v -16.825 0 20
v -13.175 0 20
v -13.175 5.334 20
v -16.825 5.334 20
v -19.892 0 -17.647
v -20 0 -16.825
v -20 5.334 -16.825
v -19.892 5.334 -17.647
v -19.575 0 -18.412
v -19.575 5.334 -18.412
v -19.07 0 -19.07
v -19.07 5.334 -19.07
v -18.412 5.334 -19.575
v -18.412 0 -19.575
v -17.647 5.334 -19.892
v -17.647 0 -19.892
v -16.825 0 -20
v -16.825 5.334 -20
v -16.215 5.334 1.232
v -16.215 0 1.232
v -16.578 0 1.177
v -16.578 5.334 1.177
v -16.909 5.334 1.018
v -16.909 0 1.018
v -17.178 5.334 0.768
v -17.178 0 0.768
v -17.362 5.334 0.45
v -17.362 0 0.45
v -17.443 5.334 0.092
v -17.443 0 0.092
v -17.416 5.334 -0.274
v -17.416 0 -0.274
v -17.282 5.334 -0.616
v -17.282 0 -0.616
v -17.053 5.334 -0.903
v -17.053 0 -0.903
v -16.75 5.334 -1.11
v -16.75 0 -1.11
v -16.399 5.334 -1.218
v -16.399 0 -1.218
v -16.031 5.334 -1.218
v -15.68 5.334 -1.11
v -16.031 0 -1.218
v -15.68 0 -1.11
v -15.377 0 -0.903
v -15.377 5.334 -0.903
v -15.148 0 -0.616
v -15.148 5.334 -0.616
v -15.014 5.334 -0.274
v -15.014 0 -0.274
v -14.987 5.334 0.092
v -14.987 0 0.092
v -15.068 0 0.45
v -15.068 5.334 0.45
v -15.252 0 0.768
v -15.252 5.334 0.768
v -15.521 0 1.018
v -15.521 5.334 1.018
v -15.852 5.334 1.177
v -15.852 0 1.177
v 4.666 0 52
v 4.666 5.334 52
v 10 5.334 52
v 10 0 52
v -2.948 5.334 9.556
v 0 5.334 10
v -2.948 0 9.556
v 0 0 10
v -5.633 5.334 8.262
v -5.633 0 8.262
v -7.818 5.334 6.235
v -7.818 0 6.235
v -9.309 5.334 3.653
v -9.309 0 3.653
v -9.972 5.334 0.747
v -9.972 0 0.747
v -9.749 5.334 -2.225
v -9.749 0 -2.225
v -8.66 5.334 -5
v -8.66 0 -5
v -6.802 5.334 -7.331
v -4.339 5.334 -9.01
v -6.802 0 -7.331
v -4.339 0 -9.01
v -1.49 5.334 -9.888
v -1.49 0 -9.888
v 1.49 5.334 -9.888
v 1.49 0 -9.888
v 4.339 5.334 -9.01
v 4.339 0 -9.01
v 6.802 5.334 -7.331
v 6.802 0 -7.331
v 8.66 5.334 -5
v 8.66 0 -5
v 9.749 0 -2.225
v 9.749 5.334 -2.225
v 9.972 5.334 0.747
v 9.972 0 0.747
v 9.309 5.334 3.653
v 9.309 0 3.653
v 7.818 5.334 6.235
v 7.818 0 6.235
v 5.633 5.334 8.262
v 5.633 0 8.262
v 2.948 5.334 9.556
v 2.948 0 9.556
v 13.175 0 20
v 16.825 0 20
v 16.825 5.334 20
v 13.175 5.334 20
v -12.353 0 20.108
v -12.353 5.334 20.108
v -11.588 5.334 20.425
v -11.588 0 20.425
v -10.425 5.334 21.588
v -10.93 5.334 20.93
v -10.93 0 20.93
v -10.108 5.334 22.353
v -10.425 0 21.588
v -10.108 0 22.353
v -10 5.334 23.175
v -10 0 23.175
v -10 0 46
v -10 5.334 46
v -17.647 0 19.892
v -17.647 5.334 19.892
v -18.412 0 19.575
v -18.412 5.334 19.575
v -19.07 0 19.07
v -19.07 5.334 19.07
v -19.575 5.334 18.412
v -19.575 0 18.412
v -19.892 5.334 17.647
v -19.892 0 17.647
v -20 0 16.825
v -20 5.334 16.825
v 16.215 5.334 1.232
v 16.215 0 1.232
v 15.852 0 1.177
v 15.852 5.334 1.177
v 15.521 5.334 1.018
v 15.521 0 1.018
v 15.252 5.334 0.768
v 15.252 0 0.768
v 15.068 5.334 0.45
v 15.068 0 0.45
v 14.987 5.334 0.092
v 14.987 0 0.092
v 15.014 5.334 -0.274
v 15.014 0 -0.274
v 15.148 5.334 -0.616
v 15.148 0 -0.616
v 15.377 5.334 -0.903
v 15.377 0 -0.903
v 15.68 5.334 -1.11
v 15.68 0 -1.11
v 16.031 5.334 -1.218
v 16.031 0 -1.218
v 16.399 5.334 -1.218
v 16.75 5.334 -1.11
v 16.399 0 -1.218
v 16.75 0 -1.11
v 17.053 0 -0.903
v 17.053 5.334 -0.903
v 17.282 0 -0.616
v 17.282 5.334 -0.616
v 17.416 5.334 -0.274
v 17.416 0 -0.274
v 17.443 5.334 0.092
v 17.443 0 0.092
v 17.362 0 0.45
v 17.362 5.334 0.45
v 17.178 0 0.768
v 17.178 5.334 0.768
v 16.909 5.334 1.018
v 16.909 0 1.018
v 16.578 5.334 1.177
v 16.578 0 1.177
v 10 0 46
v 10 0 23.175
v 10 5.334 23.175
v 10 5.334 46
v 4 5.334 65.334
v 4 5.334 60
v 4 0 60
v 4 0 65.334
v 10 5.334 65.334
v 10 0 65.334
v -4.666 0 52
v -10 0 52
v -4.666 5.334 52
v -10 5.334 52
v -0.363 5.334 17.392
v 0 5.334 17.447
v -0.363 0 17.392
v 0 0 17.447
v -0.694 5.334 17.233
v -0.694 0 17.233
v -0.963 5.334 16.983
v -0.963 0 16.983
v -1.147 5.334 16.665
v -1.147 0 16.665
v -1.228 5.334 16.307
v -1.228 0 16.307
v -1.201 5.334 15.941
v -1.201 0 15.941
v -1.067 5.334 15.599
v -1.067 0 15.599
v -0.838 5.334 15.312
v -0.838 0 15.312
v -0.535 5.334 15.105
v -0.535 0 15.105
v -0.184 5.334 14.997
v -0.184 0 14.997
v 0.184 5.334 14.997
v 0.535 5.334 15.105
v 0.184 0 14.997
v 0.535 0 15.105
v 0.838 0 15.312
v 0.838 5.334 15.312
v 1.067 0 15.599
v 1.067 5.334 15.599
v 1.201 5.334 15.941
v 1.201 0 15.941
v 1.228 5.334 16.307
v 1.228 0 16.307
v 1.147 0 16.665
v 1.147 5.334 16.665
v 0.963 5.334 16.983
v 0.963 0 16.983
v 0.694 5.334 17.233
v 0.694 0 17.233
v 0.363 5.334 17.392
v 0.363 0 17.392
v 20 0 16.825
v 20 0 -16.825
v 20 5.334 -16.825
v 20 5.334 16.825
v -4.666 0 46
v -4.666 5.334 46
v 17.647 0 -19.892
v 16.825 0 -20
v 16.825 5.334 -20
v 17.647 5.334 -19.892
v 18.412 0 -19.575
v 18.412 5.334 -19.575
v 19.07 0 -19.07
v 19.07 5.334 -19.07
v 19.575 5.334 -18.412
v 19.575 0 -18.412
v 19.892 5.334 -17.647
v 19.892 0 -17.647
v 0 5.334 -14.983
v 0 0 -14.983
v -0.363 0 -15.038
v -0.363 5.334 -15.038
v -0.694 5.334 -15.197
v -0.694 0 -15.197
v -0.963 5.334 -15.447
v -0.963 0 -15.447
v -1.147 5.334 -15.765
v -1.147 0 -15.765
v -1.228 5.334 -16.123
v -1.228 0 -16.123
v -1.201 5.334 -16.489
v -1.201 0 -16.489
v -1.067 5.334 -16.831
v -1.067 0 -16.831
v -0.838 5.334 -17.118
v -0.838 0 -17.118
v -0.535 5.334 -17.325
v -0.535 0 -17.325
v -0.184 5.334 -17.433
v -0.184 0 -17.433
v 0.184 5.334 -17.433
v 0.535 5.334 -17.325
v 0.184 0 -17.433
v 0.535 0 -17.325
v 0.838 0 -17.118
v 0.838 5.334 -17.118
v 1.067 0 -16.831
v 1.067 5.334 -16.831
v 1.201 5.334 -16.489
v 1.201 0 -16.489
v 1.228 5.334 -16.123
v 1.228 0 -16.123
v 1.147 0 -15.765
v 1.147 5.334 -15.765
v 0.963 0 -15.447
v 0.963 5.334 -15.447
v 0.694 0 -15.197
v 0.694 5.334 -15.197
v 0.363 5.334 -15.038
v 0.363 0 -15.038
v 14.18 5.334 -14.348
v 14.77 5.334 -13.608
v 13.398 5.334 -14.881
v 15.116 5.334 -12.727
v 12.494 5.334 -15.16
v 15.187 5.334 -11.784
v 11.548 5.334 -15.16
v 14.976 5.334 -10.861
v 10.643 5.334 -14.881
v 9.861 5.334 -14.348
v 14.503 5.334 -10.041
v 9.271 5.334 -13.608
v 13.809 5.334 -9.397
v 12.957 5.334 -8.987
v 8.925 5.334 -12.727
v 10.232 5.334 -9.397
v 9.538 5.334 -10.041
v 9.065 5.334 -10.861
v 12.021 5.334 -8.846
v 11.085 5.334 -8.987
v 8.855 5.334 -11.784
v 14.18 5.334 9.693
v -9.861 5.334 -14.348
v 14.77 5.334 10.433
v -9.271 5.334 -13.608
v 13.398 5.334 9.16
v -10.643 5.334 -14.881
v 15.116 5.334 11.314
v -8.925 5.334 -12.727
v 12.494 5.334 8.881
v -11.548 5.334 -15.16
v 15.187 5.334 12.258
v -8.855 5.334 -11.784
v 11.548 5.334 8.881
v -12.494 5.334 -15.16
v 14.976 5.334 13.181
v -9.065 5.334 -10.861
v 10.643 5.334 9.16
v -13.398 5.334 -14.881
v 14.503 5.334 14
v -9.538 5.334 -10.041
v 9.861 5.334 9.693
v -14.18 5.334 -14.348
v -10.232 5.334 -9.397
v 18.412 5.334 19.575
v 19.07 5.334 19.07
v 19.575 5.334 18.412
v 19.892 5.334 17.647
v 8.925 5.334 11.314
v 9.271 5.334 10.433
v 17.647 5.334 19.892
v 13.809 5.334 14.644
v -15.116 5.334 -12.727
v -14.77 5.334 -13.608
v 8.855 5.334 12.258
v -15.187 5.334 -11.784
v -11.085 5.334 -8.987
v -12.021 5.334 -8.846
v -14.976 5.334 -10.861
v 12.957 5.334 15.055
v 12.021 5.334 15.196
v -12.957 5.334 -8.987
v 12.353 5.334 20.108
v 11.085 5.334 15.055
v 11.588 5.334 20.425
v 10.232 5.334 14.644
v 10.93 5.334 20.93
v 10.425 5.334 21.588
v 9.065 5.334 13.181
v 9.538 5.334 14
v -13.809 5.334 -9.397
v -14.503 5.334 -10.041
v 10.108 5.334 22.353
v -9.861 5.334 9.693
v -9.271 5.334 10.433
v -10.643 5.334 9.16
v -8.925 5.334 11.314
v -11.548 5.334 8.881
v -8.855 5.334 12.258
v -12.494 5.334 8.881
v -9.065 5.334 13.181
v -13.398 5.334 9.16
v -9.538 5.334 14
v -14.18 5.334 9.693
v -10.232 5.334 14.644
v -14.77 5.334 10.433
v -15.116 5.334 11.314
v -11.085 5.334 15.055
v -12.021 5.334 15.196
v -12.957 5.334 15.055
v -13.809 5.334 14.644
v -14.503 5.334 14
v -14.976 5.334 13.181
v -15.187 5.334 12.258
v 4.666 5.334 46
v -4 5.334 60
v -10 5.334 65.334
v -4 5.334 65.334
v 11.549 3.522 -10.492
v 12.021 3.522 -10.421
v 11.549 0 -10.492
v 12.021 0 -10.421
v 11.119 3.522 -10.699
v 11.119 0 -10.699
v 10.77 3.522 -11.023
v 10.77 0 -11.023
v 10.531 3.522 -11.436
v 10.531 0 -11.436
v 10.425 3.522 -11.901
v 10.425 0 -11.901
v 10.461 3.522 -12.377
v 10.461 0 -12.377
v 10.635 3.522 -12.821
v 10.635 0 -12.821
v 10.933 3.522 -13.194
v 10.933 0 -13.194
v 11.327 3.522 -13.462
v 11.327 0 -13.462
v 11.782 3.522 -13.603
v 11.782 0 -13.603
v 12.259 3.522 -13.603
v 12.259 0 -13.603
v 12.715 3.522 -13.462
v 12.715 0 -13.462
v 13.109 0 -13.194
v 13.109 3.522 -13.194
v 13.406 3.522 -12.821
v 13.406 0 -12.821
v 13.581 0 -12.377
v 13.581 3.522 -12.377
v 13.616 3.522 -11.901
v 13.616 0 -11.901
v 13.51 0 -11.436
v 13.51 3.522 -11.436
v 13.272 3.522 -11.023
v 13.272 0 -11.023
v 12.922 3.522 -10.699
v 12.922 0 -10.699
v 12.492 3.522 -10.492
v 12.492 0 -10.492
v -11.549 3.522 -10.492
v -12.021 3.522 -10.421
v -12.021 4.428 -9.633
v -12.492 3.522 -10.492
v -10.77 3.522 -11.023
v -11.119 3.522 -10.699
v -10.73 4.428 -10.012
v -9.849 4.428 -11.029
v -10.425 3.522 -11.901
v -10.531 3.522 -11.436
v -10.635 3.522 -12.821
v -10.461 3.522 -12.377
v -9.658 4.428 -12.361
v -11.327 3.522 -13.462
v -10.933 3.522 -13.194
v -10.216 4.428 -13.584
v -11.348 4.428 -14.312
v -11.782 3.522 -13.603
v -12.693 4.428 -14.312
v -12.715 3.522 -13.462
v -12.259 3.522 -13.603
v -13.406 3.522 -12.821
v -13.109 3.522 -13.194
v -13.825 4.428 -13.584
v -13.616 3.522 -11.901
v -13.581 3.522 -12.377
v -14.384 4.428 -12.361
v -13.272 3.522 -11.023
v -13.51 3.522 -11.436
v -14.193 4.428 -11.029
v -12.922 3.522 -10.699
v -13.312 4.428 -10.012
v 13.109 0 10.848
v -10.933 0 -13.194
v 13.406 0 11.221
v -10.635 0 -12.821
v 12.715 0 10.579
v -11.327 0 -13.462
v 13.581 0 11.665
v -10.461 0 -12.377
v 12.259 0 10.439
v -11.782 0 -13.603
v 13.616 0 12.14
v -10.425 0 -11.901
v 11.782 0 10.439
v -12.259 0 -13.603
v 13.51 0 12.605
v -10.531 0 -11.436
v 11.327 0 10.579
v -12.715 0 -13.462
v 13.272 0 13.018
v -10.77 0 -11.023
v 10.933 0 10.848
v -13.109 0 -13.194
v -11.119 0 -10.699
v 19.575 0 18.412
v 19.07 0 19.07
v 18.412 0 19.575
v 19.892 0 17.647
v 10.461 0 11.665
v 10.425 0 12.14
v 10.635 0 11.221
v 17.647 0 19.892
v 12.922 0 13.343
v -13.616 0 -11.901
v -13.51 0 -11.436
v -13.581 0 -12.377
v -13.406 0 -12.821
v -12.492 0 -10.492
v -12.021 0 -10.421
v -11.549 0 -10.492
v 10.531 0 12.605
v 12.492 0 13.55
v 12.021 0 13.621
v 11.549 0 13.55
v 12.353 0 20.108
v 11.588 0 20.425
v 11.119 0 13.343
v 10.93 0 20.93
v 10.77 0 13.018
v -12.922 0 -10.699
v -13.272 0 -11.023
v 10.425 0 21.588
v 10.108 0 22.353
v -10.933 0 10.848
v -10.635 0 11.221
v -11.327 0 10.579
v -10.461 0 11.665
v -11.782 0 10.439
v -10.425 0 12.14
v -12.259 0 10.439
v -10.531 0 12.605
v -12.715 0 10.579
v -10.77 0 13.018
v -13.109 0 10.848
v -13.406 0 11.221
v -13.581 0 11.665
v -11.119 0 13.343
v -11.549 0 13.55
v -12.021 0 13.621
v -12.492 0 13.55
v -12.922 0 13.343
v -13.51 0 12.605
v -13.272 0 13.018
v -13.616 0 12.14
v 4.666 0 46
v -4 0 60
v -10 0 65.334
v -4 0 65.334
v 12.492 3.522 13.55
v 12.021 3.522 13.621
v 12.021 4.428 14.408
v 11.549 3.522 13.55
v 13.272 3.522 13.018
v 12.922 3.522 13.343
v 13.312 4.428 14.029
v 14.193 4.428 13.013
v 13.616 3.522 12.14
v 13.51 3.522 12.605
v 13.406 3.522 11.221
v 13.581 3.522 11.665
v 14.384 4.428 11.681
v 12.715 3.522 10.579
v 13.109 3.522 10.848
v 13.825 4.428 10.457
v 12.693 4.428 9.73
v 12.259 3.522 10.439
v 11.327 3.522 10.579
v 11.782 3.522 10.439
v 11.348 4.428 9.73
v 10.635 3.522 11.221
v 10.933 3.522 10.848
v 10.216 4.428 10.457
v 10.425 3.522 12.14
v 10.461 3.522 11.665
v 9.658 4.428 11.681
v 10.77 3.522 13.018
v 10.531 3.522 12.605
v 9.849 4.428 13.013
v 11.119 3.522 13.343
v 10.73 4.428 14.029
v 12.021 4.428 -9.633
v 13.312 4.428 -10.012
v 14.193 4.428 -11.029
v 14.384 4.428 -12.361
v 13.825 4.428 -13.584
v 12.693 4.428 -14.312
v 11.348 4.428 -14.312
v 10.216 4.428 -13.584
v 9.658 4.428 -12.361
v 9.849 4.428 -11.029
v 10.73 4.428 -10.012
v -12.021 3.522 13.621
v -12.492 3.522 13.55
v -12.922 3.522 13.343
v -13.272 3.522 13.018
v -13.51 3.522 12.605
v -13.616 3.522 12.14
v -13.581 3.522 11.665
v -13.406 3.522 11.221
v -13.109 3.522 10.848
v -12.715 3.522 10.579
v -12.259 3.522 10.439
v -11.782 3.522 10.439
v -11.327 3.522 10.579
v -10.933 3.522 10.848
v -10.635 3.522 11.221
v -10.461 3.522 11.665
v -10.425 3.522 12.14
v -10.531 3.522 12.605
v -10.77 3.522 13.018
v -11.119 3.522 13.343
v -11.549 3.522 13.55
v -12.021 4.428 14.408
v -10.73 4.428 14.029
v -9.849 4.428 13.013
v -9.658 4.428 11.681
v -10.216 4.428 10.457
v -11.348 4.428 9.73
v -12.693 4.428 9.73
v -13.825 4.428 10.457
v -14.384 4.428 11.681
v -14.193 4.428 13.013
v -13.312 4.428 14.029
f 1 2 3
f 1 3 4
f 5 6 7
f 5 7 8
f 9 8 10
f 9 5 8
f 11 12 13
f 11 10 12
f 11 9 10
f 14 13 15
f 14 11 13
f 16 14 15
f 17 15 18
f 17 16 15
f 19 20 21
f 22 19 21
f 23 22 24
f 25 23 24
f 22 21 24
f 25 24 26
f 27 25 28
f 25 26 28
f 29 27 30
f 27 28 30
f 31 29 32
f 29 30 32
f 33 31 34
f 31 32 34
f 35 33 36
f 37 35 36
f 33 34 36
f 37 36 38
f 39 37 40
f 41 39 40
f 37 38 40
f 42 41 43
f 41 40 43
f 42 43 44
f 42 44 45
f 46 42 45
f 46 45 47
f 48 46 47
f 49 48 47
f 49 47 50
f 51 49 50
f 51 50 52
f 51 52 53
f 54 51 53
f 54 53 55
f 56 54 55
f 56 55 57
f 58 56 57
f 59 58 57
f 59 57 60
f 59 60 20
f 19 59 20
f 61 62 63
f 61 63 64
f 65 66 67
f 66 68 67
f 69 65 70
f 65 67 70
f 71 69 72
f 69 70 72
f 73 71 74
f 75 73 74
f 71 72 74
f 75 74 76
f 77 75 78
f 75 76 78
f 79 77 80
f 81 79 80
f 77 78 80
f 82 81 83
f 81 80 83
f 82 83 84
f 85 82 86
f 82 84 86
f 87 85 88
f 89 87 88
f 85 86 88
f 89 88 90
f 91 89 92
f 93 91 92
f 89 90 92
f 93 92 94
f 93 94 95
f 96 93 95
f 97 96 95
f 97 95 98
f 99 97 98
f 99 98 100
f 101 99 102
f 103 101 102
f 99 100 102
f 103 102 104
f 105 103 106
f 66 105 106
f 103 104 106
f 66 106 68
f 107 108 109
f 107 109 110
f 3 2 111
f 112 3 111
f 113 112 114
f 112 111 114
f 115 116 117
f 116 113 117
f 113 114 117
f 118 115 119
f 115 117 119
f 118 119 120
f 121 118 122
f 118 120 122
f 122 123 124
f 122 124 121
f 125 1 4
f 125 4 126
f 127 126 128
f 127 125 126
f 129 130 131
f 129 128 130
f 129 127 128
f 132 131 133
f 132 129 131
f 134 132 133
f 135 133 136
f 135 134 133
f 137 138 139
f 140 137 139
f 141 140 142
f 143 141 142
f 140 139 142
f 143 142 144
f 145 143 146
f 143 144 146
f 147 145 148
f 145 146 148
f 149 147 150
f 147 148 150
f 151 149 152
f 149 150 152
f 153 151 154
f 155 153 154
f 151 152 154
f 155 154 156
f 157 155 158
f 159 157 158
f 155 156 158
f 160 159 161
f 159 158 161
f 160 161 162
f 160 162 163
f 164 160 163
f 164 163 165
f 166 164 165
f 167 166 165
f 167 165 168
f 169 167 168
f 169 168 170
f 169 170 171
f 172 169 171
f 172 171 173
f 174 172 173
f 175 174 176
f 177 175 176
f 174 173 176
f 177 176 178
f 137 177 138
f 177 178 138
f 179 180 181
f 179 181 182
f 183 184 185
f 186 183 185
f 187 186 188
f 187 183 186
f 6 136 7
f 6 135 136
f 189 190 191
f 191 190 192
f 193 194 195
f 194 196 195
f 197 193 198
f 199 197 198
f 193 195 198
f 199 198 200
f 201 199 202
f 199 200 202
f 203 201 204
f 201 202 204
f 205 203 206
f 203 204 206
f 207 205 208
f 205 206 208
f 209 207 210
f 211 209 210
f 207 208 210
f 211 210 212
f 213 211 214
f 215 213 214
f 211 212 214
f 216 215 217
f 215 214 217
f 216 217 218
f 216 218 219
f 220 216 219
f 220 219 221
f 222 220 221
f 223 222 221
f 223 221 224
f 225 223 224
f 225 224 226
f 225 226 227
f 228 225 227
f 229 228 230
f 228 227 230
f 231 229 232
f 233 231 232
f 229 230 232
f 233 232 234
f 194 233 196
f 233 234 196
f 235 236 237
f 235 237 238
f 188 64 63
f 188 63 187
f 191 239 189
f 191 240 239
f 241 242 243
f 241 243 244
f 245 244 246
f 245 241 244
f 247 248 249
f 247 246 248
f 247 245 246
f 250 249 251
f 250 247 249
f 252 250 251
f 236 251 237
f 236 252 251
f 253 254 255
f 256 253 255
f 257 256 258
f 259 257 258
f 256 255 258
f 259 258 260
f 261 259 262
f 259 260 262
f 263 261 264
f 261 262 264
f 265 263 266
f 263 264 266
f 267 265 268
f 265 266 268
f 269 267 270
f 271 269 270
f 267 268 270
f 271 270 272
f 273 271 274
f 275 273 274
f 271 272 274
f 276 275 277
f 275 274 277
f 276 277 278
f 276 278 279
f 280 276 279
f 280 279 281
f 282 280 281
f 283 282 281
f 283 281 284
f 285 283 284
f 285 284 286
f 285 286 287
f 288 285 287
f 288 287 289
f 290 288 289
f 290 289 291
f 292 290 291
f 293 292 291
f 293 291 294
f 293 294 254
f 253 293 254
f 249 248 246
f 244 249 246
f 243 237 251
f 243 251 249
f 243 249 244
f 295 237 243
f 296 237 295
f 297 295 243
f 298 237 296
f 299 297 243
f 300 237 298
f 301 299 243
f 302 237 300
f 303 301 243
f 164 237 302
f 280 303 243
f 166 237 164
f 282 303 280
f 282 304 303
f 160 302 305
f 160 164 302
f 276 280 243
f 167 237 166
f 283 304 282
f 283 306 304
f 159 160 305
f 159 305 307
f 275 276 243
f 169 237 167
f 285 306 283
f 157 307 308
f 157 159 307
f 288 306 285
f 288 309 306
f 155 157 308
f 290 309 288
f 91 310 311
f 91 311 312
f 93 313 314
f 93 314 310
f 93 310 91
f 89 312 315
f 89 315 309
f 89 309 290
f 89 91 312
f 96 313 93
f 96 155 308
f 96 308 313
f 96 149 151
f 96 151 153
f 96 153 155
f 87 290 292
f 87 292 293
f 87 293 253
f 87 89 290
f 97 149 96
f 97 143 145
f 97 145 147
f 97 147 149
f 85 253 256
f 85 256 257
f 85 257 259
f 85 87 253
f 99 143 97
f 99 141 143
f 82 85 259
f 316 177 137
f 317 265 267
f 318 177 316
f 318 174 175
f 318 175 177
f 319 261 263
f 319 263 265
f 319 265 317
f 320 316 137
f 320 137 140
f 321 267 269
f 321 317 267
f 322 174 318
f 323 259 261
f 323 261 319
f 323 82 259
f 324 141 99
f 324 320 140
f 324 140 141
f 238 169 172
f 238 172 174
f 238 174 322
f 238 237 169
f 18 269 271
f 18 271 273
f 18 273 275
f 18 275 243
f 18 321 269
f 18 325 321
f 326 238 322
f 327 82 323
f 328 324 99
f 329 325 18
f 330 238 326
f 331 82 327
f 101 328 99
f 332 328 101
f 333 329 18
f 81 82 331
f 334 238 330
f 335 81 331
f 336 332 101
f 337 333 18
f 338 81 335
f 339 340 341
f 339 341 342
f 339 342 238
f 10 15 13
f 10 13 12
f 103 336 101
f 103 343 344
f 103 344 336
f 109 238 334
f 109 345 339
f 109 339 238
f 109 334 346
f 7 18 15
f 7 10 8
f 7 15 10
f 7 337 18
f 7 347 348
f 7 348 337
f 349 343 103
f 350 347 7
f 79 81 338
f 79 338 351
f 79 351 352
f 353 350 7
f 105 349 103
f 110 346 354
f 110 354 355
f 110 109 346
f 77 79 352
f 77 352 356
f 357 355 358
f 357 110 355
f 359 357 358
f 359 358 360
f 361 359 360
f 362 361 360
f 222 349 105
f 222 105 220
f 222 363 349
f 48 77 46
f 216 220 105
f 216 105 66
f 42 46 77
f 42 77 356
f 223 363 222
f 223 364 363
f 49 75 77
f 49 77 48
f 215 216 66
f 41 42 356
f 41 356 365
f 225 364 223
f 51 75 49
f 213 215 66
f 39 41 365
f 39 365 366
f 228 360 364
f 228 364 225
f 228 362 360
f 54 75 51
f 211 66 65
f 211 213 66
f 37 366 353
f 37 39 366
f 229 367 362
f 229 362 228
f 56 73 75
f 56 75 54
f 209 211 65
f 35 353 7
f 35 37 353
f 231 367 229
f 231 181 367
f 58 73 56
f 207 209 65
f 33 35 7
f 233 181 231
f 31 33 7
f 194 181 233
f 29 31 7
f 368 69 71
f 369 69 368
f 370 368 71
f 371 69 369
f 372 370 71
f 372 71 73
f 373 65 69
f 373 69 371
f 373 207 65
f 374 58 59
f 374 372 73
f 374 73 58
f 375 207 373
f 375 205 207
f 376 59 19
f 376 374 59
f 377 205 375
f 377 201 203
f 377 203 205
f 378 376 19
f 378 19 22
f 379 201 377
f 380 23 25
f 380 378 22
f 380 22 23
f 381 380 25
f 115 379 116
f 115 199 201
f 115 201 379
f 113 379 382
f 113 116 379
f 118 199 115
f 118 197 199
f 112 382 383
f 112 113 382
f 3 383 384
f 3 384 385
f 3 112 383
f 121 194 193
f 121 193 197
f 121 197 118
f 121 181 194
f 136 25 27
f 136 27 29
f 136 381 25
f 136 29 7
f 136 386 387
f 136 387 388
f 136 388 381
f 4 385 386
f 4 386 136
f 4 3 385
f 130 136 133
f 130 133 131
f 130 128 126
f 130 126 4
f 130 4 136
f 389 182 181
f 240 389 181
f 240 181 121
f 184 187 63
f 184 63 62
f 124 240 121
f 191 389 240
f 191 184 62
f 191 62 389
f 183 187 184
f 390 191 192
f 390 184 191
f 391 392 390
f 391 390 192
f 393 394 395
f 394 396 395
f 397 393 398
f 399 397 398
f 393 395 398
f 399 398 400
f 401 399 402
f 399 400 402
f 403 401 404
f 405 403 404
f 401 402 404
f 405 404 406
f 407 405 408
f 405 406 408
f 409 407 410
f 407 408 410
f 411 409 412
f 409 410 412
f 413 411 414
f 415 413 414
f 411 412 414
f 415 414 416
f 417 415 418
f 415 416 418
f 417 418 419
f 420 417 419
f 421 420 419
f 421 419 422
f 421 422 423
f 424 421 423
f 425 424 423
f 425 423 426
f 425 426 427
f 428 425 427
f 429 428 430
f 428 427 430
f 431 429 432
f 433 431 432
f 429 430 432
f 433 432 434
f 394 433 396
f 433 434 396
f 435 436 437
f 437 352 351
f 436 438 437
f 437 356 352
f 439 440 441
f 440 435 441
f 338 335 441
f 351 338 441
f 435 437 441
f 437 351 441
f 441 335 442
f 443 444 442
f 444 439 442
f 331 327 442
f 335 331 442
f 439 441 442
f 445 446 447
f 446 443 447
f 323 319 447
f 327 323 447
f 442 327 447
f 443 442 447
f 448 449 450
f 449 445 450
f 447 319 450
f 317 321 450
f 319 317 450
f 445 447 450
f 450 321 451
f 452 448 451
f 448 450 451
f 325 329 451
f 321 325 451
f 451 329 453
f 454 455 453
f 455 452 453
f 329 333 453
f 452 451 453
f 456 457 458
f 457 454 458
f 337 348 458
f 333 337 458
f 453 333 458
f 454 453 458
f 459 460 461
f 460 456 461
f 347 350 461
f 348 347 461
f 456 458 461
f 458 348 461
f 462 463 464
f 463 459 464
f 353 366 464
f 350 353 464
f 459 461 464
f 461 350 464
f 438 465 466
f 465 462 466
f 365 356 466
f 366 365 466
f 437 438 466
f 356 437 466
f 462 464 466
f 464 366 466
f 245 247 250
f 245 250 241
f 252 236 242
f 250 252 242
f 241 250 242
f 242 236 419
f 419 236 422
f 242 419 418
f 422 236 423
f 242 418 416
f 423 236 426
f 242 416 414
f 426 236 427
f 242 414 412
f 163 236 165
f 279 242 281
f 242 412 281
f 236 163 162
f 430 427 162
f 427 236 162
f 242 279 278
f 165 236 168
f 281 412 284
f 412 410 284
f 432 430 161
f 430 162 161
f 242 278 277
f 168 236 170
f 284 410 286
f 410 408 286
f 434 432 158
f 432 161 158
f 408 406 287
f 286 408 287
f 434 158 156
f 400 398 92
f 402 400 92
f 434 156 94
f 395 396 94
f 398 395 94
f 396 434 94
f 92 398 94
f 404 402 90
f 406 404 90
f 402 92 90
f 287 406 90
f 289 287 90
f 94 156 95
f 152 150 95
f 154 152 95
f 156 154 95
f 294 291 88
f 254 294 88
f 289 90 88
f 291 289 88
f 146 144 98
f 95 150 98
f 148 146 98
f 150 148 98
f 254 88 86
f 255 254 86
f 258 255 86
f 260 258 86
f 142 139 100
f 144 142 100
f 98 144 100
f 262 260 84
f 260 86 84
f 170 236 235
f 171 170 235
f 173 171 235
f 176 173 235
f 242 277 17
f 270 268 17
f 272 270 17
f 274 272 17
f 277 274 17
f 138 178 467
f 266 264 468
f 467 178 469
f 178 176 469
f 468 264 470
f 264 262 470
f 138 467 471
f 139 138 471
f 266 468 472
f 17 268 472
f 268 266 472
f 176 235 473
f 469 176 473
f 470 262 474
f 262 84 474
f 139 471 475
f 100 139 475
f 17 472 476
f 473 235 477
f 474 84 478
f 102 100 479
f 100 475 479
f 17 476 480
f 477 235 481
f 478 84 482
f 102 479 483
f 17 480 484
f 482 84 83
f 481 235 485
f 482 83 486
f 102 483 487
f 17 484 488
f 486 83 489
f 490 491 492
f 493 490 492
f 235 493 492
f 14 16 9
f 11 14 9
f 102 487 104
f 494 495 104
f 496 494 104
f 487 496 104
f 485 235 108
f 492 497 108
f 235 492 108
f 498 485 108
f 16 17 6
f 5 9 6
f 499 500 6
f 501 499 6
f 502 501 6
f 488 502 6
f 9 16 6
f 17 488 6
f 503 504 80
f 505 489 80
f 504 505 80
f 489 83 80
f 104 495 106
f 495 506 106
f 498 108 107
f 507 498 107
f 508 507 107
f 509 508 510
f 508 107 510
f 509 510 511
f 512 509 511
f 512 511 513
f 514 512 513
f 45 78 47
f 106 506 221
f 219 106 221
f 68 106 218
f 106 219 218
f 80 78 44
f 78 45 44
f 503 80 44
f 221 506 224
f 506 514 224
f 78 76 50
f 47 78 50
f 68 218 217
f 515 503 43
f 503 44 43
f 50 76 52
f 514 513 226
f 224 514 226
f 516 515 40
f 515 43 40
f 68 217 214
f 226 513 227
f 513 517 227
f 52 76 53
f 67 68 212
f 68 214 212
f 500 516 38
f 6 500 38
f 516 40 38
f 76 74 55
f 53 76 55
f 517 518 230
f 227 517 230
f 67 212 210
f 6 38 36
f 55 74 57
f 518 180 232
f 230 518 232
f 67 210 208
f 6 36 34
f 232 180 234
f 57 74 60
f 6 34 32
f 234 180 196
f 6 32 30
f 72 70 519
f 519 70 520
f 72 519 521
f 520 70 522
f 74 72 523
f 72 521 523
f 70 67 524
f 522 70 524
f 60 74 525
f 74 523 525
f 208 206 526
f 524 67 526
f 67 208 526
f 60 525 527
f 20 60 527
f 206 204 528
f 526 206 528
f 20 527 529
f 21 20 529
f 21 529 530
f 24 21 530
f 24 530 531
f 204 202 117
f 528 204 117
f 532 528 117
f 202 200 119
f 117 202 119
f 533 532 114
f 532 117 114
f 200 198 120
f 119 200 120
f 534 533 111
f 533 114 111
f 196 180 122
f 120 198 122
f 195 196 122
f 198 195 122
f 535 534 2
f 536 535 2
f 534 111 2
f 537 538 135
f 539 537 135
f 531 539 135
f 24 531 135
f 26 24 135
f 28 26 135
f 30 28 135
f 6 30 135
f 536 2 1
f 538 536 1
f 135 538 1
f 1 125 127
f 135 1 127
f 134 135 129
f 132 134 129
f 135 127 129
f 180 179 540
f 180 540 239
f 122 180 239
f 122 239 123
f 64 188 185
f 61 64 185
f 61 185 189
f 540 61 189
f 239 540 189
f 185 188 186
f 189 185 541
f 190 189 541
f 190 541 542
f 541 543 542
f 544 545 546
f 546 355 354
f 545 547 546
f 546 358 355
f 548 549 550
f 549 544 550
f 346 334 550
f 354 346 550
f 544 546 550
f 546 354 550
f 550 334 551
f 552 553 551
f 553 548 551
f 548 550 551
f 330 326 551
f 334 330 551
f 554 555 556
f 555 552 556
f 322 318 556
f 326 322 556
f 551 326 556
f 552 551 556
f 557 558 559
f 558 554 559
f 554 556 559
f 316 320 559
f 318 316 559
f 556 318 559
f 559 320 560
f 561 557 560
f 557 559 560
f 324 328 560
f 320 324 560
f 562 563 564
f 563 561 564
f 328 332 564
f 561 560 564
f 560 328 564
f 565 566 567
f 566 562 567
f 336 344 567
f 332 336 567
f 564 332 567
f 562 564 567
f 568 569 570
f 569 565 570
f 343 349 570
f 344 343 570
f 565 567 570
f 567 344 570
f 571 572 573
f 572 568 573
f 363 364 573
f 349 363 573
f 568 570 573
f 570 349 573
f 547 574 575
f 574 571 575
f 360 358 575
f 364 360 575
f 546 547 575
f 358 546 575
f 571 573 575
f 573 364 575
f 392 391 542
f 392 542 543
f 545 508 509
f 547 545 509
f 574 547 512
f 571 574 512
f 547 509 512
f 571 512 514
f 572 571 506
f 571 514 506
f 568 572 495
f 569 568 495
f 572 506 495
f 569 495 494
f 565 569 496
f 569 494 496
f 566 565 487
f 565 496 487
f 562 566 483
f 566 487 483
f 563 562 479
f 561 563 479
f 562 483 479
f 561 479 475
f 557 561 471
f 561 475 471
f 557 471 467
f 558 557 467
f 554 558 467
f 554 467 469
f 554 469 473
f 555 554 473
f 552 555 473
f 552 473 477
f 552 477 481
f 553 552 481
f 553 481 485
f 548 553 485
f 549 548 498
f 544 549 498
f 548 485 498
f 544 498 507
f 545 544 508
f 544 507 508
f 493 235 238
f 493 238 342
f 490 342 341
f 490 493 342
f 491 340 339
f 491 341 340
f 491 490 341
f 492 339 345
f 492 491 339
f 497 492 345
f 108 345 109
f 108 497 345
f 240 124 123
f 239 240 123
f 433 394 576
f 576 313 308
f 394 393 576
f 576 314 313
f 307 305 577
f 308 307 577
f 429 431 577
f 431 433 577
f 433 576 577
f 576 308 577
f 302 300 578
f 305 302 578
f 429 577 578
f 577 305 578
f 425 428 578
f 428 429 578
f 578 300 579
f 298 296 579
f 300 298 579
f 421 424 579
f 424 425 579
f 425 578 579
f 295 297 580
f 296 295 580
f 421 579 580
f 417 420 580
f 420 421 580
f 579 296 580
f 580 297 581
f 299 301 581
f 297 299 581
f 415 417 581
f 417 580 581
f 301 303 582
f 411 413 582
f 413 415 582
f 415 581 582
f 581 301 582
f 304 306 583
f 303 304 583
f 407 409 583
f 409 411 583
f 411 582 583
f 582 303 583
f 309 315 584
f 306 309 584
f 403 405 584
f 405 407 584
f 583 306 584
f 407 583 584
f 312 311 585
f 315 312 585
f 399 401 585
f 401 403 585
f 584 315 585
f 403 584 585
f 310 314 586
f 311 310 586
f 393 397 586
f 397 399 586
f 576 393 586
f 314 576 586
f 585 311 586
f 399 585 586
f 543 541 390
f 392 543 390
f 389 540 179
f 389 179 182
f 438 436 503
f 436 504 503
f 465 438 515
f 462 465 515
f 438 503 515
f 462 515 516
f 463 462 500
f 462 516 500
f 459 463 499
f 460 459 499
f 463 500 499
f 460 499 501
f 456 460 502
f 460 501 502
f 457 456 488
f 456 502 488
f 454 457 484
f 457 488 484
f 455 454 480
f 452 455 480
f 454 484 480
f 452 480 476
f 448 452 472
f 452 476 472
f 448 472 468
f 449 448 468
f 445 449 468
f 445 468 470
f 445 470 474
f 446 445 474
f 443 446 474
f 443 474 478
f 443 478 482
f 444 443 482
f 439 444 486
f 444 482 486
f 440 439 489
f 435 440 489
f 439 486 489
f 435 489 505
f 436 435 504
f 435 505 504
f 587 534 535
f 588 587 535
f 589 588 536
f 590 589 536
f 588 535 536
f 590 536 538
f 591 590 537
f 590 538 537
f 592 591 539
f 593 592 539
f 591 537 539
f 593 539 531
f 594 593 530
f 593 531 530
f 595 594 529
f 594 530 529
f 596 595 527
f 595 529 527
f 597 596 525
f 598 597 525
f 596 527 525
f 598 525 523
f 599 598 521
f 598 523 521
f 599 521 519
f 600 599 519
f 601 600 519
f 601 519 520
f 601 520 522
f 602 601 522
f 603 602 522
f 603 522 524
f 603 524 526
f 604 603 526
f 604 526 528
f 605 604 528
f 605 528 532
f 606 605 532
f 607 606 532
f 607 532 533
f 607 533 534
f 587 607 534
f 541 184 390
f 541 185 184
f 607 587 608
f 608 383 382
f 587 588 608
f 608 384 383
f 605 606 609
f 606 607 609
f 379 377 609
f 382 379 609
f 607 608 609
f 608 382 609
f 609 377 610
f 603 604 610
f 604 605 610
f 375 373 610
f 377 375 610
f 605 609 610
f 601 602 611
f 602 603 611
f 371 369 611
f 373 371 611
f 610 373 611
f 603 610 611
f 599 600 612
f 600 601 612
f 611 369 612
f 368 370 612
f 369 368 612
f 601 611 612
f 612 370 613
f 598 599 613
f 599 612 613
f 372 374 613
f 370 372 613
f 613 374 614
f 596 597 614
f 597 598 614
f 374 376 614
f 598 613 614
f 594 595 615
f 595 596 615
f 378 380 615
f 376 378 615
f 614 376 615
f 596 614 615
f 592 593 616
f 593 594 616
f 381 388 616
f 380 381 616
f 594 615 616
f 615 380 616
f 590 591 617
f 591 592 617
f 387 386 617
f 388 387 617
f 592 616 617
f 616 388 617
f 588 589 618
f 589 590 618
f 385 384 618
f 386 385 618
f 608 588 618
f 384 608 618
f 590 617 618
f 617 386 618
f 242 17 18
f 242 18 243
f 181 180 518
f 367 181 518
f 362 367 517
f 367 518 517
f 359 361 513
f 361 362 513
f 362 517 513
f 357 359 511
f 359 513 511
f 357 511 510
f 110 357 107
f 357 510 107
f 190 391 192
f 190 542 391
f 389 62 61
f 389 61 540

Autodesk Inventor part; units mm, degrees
ref_plane "YZ Plane" through (0, 0, 0) normal (1, 0, 0) x (0, 1, 0)
ref_plane "XZ Plane" through (0, 0, 0) normal (0, 1, 0) x (-1, 0, 0)
ref_plane "XY Plane" through (0, 0, 0) normal (0, 0, 1) x (1, 0, 0)
sketch "Sketch1" plane through (0, 0, 0) normal (0, 1, 0) x (-1, 0, 0)
  line L0 (20, 16.825) -> (20, -16.825)
  line L1 (16.825, -20) -> (-16.825, -20)
  line L2 (-20, -16.825) -> (-20, 16.825)
  line L3 (-16.825, 20) -> (-13.175, 20)
  line L4 (-10, 23.175) -> (-10, 60)
  line L5 (-10, 60) -> (10, 60)
  line L6 (10, 60) -> (10, 23.175)
  line L7 (13.175, 20) -> (16.825, 20)
  arc A0 (10, 23.175) -> (13.175, 20) centre (13.175, 23.175) ccw
  arc A1 (-13.175, 20) -> (-10, 23.175) centre (-13.175, 23.175) ccw
  arc A2 (20, 16.825) -> (16.825, 20) centre (16.825, 16.825) ccw
  arc A3 (16.825, -20) -> (20, -16.825) centre (16.825, -16.825) ccw
  arc A4 (-20, -16.825) -> (-16.825, -20) centre (-16.825, -16.825) ccw
  arc A5 (-16.825, 20) -> (-20, 16.825) centre (-16.825, 16.825) ccw
  point P0 (0, 0)
  point P1 (20, 20)
  point P2 (20, -20)
  point P3 (-20, -20)
  point P4 (-20, 20)
  point P5 (-10, 20)
  point P6 (10, 20)
  point P7 (20, 0)
  point P8 (0, -20)
  point P9 (0, 60)
  dimension "d0" = 40
  dimension "d1" = 40
  dimension "d2" = 20
  dimension "d3" = 60
  dimension "d26" = 3.175
  dimension "d27" = 3.175
extrude "Extrusion1" add sketch "Sketch1" along normal blind 5.334
sketch "Sketch2" plane through (0, 5.334, 0) normal (0, 1, 0) x (1, 0, 0)
  line L0 (-12.0208, -12.0208) -> (0, 0)
  line L1 (0, 0) -> (-20, 0)
  line L2 (-20, 16.825) -> (-20, -16.825) projected
  point P0 (-17.5, 17.5)
  point P1 (-17.5, -17.5)
  point P2 (12.0208, -12.0208)
  point P3 (12.0208, 12.0208)
  point P4 (-12.0208, 12.0208)
  dimension "d6" = 17
  dimension "d7" = 45
  dimension "d10" = 360
hole "Hole1" at (-12.0208, 5.334, 12.0208) at (12.0208, 5.334, 12.0208) at (12.0208, 5.334, -12.0208) at (-12.0208, 5.334, -12.0208) direction (0, -1, 0) diameter 3.2 end through all countersink diameter 6.35 countersink angle 82
sketch "Sketch3" plane through (0, 5.334, 0) normal (0, 1, 0) x (1, 0, 0)
  point P0 (0, 0)
  point P1 (0, 0)
hole "Hole2" at (0, 5.334, 0) direction (0, -1, 0) diameter 20 end through all
sketch "Sketch4" plane through (0, 5.334, 0) normal (0, 1, 0) x (1, 0, 0)
  point P0 (0, 0)
  point P1 (-16.215, 0)
  point P2 (0, -16.215)
  point P3 (16.215, 0)
  point P4 (0, 16.215)
  dimension "d29" = 16.215
  dimension "d47" = 360
hole "Hole3" at (-16.215, 5.334, 0) at (0, 5.334, 16.215) at (16.215, 5.334, 0) at (0, 5.334, -16.215) direction (0, -1, 0) diameter 2.4638 end through all
sketch "Sketch6" plane through (10, 0, 60) normal (1, 0, 0) x (0, 0, -1)
  line L0 (0, 5.334) -> (36.825, 5.334) projected
  line L1 (0, 0) -> (36.825, 0) projected
  line L2 (14, 5.334) -> (8, 5.334)
  line L3 (8, 5.334) -> (8, 0)
  line L4 (8, 0) -> (14, 0)
  line L5 (14, 0) -> (14, 5.334)
  line L6 (0, 0) -> (0, 5.334) projected
  point P0 (60, 0)
  dimension "d41" = 6
  dimension "d42" = 8
extrude "Extrusion3" cut sketch "Sketch6" against normal blind 5.334 contours L0 L5 L1 L3
sketch "Sketch5" plane through (-10, 0, 60) normal (0, 0, 1) x (1, 0, 0)
  line L0 (26.825, 0) -> (-6.825, 0) projected
  line L1 (20, 5.334) -> (14, 5.334)
  line L2 (14, 5.334) -> (14, 0)
  line L3 (14, 0) -> (20, 0)
  line L4 (20, 0) -> (20, 5.334)
  line L5 (0, 5.334) -> (20, 5.334) projected
  line L6 (0, 0) -> (6, 0)
  line L7 (6, 0) -> (6, 5.334)
  line L8 (6, 5.334) -> (0, 5.334)
  line L9 (0, 5.334) -> (0, 0)
  point P0 (10, 0)
  dimension "d37" = 6
  dimension "d38" = 6
extrude "Extrusion2" add sketch "Sketch5" along normal blind 5.334 contours L0 L2 L1 L4 | L0 L9 L5 L7
mirror "Mirror1" about plane through (0, 0, 0) normal (1, 0, 0) of "Extrusion3"
equation "\"d38\" = d37"
properties part number "pitch_mount"
